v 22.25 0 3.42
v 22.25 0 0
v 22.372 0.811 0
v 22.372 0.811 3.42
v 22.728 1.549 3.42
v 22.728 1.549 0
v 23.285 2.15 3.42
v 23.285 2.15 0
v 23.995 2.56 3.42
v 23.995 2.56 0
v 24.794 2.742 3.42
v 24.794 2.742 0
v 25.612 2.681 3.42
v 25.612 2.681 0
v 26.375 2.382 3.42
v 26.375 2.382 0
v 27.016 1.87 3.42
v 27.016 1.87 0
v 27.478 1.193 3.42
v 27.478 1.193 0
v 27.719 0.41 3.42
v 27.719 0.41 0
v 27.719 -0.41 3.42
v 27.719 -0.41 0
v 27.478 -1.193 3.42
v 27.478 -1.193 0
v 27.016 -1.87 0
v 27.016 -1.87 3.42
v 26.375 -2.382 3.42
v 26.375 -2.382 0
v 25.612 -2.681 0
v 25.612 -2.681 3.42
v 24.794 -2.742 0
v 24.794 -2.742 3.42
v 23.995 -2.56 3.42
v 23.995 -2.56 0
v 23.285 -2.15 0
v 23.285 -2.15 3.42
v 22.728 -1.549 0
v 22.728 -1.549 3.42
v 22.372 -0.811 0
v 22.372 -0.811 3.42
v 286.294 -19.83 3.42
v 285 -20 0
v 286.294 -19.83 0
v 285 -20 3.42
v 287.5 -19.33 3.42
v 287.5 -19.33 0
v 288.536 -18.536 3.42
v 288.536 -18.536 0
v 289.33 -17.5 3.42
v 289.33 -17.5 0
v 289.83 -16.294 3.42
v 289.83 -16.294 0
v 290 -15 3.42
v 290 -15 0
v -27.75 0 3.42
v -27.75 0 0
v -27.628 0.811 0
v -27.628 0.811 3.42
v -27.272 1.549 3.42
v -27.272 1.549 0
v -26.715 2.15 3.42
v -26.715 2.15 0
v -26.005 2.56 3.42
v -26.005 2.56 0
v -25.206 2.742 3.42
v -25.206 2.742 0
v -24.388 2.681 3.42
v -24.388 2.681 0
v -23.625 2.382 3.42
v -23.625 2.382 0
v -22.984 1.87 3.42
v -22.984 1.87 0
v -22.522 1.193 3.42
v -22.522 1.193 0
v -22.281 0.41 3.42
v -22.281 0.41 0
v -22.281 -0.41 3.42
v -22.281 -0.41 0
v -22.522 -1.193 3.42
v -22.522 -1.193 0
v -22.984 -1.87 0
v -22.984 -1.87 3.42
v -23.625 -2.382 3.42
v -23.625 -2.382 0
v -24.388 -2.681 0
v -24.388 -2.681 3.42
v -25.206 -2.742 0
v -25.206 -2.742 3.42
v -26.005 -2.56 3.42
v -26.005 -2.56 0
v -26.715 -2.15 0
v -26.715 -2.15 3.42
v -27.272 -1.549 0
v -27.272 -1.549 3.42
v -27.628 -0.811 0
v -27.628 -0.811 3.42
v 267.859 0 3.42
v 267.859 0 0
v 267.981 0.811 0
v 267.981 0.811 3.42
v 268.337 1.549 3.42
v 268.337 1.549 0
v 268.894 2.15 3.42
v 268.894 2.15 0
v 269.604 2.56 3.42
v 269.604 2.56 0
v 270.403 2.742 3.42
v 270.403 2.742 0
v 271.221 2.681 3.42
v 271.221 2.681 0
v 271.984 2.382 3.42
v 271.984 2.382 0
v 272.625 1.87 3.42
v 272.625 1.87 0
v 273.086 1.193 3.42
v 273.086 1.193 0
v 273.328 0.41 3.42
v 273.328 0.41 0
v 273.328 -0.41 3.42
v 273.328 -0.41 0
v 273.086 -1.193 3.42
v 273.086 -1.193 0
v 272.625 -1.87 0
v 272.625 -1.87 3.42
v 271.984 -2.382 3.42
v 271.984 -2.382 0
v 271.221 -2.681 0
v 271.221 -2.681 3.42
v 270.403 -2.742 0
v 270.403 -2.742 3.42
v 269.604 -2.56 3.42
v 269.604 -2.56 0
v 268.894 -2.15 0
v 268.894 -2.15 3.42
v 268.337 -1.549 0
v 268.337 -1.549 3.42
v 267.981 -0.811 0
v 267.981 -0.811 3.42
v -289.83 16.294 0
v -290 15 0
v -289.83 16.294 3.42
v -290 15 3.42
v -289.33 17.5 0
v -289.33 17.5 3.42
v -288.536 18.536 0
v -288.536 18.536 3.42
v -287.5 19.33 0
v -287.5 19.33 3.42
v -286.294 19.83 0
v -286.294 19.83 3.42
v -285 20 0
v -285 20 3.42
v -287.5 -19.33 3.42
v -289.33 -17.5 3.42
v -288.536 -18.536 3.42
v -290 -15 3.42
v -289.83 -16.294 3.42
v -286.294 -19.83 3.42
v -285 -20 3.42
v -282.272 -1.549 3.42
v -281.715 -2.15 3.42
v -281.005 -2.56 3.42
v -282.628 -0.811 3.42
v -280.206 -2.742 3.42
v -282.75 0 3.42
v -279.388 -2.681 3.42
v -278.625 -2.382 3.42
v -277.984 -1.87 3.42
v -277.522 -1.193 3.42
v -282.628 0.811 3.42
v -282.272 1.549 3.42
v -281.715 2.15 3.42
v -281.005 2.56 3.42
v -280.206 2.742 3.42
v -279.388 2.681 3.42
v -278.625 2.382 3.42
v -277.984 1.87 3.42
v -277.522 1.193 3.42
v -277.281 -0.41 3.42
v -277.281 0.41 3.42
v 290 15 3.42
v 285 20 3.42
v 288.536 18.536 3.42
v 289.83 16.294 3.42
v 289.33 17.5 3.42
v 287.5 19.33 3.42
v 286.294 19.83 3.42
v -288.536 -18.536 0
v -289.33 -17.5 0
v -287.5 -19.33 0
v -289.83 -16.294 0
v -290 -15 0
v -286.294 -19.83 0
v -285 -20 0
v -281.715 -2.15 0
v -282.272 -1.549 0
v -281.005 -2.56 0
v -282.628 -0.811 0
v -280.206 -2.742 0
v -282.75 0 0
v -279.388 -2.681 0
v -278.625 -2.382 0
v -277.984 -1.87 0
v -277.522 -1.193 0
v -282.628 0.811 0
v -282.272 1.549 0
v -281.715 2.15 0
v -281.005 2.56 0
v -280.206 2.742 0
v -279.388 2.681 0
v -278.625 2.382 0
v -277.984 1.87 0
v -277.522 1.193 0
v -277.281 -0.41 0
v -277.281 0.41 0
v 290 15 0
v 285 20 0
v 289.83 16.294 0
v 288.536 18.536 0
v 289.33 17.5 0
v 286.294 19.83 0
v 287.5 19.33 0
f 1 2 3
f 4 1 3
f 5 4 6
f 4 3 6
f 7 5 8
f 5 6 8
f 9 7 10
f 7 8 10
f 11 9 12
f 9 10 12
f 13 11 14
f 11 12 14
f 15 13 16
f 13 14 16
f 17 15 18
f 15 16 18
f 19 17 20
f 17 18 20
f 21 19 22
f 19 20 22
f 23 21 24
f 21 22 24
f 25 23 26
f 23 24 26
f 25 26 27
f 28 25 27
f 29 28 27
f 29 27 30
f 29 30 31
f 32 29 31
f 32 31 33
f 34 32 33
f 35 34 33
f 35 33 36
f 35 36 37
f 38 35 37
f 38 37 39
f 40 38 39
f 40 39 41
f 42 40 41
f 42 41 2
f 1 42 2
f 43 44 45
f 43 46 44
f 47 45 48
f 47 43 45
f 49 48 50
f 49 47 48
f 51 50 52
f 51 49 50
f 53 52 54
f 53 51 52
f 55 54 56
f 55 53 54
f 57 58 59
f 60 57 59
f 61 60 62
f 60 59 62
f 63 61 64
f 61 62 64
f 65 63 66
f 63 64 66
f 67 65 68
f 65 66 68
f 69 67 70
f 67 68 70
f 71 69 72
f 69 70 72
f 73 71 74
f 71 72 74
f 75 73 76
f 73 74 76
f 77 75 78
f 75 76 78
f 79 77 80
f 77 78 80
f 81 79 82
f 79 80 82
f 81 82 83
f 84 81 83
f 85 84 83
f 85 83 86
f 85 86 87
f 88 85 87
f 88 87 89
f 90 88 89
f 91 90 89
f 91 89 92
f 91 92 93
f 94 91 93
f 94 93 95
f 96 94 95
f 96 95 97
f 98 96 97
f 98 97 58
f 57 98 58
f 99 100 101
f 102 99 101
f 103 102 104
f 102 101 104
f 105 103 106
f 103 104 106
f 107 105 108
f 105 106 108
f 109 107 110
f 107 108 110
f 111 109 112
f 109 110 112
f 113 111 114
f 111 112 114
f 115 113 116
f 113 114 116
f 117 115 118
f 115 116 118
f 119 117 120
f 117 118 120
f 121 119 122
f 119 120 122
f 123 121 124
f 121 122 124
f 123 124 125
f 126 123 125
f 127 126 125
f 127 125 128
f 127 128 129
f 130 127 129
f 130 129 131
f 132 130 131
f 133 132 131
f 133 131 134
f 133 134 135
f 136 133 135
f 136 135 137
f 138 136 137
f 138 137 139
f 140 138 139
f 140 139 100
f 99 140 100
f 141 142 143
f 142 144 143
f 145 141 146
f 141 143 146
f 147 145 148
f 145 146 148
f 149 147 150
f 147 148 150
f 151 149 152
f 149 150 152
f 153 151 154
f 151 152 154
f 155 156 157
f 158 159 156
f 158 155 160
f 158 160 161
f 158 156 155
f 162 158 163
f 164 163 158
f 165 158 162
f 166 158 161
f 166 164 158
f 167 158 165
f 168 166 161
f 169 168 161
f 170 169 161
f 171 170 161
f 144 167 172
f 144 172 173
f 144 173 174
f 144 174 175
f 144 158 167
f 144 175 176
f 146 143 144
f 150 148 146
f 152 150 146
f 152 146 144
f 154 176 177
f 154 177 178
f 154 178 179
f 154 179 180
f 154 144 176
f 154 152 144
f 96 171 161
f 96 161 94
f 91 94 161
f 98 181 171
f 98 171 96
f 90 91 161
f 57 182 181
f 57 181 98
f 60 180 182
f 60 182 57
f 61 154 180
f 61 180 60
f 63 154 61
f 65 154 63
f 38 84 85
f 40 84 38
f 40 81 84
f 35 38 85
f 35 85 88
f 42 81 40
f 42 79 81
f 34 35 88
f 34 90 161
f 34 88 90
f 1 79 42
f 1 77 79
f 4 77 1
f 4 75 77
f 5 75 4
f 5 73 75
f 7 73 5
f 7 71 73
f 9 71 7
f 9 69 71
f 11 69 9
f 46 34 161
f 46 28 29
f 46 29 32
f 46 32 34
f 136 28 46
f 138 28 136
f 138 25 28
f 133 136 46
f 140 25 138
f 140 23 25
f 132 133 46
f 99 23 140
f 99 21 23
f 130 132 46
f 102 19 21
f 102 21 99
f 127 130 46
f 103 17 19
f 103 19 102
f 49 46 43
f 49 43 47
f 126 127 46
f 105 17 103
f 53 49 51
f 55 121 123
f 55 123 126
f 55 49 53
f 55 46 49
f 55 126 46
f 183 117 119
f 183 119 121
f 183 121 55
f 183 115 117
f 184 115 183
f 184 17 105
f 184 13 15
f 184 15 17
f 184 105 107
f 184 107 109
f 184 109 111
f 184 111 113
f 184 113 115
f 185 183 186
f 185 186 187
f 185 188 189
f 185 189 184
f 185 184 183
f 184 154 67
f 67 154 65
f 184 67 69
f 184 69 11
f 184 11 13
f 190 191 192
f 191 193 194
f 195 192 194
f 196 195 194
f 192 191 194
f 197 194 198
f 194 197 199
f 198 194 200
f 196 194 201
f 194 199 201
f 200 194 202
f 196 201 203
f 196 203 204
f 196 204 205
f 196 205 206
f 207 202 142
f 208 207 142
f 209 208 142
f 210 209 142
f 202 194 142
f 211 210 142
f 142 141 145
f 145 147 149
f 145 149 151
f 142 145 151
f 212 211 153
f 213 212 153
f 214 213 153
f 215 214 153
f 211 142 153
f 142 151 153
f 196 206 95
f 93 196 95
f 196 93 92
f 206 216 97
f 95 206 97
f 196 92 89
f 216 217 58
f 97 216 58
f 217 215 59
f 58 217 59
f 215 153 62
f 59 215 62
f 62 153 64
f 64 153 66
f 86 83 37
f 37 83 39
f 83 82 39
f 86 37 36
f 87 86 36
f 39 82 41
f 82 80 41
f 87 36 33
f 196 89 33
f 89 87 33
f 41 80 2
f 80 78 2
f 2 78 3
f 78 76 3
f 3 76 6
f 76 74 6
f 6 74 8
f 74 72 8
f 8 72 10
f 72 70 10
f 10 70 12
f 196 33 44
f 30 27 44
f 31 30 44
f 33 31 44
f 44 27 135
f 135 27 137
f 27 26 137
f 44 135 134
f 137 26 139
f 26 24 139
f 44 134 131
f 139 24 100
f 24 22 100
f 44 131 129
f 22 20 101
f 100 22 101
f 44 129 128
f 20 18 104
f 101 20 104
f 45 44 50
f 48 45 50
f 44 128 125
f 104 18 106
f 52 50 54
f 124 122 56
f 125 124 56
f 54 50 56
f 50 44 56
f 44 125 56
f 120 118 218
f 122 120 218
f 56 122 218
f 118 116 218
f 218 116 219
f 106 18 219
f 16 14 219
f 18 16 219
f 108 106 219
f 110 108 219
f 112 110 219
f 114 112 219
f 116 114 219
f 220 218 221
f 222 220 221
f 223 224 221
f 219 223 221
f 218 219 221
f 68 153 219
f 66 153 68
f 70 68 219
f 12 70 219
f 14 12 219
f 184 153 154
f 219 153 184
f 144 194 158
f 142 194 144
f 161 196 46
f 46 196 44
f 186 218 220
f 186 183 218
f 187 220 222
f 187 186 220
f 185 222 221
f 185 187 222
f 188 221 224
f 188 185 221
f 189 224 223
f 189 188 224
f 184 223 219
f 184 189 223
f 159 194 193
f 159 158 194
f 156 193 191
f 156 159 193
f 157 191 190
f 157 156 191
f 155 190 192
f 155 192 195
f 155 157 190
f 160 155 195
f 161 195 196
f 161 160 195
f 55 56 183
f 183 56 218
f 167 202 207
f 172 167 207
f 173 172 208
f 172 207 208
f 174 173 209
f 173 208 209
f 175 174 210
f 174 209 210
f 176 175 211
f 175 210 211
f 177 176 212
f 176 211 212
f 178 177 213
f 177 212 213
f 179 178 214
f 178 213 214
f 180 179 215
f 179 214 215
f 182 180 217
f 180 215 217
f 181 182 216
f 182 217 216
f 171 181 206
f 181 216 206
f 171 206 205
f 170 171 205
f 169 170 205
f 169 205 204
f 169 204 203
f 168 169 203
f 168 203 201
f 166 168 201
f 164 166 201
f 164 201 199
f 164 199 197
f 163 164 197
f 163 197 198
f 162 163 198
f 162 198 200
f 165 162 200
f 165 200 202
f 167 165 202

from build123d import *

# Parameters (mm, degrees)
F0_W     = 580
F0_H     = 40
F1_DEPTH = 3.42
F2_R     = 5
F4_D     = 5.5


with BuildPart() as f1:
    # F0 (on Top) → F1 (new body)
    with BuildSketch(Plane.XY):
        Rectangle(F0_W, F0_H)
    extrude(amount=F1_DEPTH)

    # F2
    f2_edges = [f1.edges().sort_by_distance(p)[0] for p in [
        (-290, 20, 1.71),
        (-290, -20, 1.71),
        (290, 20, 1.71),
        (290, -20, 1.71),
    ]]
    fillet(f2_edges, radius=F2_R)

    # F4 (through all)
    with Locations(Plane.XY.offset(3.42)):
        with Locations((-280, 0), (-25, 0), (25, 0), (270.6087231636, 0)):
            Hole(F4_D / 2)


solid = f1.part
